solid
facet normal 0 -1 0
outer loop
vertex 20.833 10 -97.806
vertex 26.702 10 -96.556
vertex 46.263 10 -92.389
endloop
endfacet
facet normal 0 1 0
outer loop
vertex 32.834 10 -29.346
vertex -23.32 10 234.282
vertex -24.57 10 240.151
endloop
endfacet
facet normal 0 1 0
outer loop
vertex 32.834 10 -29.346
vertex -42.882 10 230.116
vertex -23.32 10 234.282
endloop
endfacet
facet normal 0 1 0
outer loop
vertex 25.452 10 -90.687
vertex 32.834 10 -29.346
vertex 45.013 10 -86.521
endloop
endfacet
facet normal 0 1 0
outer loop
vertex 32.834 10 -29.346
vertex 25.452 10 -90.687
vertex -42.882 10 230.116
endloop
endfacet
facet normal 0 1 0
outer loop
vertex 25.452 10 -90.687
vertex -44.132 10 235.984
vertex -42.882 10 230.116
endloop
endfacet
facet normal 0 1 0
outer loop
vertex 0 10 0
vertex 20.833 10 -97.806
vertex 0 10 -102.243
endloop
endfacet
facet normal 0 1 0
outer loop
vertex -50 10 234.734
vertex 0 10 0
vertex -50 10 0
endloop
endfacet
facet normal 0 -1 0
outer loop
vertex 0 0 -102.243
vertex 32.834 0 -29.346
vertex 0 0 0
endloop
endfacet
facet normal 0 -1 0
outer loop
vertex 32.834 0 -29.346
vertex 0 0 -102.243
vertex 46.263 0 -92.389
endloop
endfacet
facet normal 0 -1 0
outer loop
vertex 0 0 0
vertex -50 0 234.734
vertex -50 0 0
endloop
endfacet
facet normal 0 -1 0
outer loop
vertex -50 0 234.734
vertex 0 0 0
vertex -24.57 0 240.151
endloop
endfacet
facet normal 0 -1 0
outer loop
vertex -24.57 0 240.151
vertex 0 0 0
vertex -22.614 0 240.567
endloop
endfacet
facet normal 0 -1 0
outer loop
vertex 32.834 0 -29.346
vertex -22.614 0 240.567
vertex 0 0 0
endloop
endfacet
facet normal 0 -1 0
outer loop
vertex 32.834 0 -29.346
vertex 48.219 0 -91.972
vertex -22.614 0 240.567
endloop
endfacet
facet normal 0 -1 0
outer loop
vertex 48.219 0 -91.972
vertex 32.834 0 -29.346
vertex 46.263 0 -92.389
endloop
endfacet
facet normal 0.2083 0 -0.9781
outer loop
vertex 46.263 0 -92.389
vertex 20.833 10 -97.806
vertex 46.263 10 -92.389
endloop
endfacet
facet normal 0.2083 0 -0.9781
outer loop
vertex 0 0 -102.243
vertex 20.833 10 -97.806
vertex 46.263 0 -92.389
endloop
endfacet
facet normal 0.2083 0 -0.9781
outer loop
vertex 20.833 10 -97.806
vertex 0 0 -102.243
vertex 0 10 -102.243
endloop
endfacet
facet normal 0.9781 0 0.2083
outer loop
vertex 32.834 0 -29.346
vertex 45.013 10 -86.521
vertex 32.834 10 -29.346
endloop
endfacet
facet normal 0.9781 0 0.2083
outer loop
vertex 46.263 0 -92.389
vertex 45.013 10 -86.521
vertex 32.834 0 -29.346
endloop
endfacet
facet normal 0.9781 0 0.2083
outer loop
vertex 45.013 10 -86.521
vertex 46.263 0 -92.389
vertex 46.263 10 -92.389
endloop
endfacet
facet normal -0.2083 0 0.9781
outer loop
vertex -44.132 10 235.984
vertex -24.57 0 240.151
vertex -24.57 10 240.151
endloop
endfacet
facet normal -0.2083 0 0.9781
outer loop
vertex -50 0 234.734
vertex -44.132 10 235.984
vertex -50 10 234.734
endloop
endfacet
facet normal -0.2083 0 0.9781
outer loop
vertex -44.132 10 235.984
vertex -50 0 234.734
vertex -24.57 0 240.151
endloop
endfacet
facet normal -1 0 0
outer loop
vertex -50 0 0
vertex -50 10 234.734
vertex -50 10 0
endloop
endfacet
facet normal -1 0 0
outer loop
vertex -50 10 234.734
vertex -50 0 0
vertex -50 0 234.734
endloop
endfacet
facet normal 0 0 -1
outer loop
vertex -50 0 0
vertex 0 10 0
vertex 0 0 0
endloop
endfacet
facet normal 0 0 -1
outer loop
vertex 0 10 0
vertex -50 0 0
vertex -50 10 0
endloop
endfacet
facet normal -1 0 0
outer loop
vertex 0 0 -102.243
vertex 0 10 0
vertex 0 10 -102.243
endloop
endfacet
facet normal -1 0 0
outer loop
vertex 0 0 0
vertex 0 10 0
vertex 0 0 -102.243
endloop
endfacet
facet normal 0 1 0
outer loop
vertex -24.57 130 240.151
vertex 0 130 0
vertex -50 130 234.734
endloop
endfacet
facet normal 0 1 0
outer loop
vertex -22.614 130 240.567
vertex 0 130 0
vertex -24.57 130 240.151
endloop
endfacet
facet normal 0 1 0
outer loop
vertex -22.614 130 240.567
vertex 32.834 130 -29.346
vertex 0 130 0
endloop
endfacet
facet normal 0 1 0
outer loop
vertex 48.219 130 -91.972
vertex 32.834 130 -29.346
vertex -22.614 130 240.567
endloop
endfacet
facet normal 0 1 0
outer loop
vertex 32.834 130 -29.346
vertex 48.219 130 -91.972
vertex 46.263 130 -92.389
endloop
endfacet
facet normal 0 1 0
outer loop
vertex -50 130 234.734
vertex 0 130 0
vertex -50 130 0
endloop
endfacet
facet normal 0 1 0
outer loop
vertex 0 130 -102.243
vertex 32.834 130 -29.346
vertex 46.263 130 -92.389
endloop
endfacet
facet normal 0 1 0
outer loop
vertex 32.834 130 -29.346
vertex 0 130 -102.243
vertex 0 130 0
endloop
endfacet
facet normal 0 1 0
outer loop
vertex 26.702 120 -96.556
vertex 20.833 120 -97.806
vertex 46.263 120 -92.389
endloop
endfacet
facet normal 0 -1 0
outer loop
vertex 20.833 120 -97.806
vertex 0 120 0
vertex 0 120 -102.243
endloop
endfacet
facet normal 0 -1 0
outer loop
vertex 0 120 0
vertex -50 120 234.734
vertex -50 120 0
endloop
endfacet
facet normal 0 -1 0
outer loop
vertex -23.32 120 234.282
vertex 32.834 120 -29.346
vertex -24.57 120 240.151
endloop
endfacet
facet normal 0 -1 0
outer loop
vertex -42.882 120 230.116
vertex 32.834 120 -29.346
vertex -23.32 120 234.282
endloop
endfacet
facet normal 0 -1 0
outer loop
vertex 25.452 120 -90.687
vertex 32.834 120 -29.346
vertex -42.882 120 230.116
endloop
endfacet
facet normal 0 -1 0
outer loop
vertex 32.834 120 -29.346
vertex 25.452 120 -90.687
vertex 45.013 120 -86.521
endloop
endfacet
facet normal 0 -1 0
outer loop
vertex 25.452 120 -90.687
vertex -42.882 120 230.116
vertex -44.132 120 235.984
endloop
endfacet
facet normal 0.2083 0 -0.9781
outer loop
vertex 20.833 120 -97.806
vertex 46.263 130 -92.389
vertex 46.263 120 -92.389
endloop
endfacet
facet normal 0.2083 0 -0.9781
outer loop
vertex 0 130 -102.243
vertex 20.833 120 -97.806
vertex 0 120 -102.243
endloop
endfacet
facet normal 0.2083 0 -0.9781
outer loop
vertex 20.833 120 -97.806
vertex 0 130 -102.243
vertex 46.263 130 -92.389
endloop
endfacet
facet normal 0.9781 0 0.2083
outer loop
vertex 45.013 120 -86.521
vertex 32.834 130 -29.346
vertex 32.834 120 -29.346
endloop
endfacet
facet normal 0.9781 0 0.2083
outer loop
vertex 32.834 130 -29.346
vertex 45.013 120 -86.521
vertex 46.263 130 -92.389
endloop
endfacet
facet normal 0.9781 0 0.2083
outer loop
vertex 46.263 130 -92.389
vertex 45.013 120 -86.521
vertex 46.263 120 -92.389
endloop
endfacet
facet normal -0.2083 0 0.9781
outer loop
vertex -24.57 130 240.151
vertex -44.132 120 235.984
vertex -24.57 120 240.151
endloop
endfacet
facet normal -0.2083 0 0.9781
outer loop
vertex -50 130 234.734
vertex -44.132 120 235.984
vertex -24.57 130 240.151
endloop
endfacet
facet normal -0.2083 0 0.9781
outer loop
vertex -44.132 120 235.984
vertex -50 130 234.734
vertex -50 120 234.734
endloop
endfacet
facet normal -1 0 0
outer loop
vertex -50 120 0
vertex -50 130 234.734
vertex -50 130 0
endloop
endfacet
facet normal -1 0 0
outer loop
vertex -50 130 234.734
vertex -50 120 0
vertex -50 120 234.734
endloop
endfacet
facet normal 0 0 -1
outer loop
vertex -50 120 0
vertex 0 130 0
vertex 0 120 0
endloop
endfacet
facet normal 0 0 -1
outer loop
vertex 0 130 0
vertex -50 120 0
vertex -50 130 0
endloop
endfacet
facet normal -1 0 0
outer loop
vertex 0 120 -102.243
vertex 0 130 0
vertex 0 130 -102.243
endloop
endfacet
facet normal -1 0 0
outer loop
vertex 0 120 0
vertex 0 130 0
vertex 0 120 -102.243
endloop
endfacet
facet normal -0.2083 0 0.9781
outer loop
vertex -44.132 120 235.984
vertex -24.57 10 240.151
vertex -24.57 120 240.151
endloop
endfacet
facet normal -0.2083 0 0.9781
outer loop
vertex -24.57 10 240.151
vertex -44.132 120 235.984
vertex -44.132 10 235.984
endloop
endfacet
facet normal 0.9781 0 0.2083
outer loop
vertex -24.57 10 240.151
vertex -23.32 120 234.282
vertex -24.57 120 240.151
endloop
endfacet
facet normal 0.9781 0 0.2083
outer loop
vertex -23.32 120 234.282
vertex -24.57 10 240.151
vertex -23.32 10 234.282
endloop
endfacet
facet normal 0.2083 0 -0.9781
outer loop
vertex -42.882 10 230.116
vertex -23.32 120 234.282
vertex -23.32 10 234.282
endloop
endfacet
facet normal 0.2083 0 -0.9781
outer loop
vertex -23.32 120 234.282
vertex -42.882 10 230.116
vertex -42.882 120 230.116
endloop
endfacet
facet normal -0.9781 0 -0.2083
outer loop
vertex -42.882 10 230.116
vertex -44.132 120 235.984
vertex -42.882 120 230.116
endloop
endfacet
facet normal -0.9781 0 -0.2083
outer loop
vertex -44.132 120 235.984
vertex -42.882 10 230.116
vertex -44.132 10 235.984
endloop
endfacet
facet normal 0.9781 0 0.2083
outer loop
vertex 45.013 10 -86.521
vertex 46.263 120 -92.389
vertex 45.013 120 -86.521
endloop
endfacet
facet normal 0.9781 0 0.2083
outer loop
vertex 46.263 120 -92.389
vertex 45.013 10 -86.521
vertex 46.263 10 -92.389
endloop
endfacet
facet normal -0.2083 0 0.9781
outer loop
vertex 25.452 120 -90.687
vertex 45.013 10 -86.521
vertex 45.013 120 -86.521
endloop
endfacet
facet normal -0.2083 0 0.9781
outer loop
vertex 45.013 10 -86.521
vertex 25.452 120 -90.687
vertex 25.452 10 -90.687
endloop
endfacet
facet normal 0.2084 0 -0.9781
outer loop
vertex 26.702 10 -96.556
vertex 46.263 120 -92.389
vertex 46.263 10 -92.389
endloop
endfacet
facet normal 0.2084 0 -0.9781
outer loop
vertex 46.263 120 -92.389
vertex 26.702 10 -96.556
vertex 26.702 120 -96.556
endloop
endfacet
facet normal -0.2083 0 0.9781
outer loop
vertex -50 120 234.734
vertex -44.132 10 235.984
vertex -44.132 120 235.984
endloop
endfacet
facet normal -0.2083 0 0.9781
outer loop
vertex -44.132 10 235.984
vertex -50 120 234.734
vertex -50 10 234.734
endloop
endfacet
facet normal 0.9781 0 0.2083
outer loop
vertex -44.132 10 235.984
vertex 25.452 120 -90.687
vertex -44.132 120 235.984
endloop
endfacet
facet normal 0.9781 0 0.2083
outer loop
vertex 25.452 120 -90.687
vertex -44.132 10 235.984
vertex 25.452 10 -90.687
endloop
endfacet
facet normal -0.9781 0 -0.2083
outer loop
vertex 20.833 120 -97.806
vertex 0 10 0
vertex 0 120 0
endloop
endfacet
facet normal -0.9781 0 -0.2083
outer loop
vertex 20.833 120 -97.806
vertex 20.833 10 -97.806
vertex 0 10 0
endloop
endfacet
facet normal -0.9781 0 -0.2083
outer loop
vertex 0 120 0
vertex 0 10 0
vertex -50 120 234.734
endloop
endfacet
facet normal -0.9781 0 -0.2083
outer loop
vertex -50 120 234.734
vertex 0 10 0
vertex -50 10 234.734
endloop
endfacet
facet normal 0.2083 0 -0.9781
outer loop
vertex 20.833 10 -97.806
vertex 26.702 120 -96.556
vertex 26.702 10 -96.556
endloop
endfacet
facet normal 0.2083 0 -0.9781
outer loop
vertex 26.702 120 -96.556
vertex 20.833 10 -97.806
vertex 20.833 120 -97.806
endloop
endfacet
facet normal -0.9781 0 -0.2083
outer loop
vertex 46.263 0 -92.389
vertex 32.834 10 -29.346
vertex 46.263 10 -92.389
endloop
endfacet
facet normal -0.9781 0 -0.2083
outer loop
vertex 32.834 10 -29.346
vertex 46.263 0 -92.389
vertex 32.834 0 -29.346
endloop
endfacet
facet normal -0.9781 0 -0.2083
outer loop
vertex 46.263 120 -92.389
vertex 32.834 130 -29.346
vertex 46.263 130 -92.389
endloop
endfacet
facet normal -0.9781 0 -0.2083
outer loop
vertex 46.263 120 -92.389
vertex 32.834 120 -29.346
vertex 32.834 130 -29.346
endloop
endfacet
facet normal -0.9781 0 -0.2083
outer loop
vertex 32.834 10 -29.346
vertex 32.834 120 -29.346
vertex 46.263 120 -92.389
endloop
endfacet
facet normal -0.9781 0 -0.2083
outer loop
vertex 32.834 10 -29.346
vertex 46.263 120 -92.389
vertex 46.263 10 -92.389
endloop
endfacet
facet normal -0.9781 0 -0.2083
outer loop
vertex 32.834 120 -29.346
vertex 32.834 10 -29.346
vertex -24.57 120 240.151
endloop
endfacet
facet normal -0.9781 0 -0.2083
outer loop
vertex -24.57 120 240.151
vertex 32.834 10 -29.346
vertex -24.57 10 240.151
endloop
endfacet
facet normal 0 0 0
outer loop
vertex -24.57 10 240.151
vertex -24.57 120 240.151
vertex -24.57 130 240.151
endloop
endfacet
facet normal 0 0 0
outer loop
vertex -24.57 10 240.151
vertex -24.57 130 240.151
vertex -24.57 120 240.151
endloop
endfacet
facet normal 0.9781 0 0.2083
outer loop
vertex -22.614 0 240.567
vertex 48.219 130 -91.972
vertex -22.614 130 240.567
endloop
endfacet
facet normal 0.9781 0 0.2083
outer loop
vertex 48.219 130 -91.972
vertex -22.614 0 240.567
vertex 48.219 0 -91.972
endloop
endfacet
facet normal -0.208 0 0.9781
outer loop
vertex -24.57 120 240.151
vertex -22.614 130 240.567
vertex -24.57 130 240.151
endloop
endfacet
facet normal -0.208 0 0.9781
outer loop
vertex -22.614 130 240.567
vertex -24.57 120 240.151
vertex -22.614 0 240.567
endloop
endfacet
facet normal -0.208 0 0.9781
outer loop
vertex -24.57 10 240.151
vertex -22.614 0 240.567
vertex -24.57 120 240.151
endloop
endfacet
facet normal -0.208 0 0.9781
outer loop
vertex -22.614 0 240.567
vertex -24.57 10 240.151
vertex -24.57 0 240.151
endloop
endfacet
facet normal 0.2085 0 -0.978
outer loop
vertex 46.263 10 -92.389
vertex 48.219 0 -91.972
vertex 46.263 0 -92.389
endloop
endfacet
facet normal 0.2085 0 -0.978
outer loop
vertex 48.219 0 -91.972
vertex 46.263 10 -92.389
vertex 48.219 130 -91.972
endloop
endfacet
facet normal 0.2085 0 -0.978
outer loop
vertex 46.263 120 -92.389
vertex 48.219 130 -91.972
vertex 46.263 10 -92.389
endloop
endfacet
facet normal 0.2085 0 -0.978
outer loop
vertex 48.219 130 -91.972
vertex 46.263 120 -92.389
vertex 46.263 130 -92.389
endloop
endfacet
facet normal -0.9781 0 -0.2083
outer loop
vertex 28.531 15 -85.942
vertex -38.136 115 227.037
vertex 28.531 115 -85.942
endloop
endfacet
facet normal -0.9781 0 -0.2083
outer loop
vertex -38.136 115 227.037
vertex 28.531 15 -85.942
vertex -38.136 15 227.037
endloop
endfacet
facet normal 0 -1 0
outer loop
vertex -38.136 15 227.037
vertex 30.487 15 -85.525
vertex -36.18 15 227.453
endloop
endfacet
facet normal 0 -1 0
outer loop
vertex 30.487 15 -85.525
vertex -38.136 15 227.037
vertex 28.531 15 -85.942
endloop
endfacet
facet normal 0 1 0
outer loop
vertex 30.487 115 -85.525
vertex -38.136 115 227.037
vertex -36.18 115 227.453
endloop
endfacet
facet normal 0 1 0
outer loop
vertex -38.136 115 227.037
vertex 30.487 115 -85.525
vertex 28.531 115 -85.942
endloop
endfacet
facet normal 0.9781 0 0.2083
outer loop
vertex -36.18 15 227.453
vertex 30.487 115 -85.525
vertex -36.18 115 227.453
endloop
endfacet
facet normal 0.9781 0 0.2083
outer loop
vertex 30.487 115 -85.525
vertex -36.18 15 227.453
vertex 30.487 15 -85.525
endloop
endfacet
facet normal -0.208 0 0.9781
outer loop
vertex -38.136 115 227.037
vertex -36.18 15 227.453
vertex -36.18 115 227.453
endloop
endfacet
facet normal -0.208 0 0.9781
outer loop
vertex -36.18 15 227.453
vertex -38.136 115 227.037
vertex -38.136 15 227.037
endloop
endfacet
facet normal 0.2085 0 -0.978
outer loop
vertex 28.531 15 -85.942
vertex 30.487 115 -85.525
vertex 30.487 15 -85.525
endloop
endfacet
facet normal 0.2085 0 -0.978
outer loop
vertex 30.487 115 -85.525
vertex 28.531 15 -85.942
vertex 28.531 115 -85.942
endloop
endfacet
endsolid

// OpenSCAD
front_width = 130;
front_t = 2;
front_height = 340;

pcb_width = 100;
pcb_height = 320;
pcb_t = 2;
pcb_spacing = 16;   // from underside pcb to underside front
modthick = 22+4;
clamp_depth = 50;
below = 100;
wood_t = 10;
thinwood_t = 6;
ontop = front_height - below;
a = asin(clamp_depth / ontop);

echo("ANGLE", a);
echo("CLAMP HEIGHT", below/cos(a));


module side(){
    rotate([90,0,0])
    translate([0,0,-wood_t])
    linear_extrude(height=wood_t)
    polygon(points=[
        [-clamp_depth, 0],  // table, rear
        [-clamp_depth, cos(a)*ontop],   // top rear
        [-clamp_depth+cos(a)*modthick, cos(a)*ontop+sin(a)*modthick],   // top front
        [sin(a)*below+cos(a)*modthick, -cos(a)*below+sin(a)*modthick],  // bottom front
        [sin(a)*below, -cos(a)*below],  // bottom rear
        [0, -below/cos(a)], // bottom clamp
        [0,0] // table corner
    ]);
}

module top(){
    translate([-clamp_depth+cos(a)*modthick, 0, cos(a)*ontop+sin(a)*modthick])
    rotate([0,-a,0])
    translate([-modthick+thinwood_t,wood_t,-thinwood_t])
    cube([modthick-thinwood_t, front_width-2*wood_t, thinwood_t]);
}
module bottom(){
    translate([sin(a)*below+cos(a)*modthick, 0, -cos(a)*below+sin(a)*modthick])
    rotate([0,-a,0])
    translate([-modthick+thinwood_t,wood_t,0])
    cube([modthick-thinwood_t, front_width-2*wood_t, thinwood_t]);
}

module back(){
    rotate([0,-a,0])
    translate([0,wood_t,-below])
    cube([thinwood_t,front_width-2*wood_t, front_height]);
}

module front_panel(){
    color("darkslategray",1)
    translate([cos(a)*modthick,0,sin(a)*modthick])
    rotate([0,-a,0])
    translate([0,0,-below])
    rotate([90,0,90])
    linear_extrude(height=front_t)
    square([front_width,front_height]);
}

module pcb(){
    off = modthick - pcb_spacing;
    color("green",1)
    translate([cos(a)*off,0,sin(a)*off])
    rotate([0,-a,0])
    translate([0,(front_width-pcb_width)/2,-below+(front_height-pcb_height)/2])
    rotate([90,0,90])
    linear_extrude(height=pcb_t)
    square([pcb_width,pcb_height]);
}

module assembly(){
    
    side();
    translate([0, front_width-wood_t])side();
    top();
    bottom();
    back();
    front_panel();
    pcb();
    
}

assembly();
